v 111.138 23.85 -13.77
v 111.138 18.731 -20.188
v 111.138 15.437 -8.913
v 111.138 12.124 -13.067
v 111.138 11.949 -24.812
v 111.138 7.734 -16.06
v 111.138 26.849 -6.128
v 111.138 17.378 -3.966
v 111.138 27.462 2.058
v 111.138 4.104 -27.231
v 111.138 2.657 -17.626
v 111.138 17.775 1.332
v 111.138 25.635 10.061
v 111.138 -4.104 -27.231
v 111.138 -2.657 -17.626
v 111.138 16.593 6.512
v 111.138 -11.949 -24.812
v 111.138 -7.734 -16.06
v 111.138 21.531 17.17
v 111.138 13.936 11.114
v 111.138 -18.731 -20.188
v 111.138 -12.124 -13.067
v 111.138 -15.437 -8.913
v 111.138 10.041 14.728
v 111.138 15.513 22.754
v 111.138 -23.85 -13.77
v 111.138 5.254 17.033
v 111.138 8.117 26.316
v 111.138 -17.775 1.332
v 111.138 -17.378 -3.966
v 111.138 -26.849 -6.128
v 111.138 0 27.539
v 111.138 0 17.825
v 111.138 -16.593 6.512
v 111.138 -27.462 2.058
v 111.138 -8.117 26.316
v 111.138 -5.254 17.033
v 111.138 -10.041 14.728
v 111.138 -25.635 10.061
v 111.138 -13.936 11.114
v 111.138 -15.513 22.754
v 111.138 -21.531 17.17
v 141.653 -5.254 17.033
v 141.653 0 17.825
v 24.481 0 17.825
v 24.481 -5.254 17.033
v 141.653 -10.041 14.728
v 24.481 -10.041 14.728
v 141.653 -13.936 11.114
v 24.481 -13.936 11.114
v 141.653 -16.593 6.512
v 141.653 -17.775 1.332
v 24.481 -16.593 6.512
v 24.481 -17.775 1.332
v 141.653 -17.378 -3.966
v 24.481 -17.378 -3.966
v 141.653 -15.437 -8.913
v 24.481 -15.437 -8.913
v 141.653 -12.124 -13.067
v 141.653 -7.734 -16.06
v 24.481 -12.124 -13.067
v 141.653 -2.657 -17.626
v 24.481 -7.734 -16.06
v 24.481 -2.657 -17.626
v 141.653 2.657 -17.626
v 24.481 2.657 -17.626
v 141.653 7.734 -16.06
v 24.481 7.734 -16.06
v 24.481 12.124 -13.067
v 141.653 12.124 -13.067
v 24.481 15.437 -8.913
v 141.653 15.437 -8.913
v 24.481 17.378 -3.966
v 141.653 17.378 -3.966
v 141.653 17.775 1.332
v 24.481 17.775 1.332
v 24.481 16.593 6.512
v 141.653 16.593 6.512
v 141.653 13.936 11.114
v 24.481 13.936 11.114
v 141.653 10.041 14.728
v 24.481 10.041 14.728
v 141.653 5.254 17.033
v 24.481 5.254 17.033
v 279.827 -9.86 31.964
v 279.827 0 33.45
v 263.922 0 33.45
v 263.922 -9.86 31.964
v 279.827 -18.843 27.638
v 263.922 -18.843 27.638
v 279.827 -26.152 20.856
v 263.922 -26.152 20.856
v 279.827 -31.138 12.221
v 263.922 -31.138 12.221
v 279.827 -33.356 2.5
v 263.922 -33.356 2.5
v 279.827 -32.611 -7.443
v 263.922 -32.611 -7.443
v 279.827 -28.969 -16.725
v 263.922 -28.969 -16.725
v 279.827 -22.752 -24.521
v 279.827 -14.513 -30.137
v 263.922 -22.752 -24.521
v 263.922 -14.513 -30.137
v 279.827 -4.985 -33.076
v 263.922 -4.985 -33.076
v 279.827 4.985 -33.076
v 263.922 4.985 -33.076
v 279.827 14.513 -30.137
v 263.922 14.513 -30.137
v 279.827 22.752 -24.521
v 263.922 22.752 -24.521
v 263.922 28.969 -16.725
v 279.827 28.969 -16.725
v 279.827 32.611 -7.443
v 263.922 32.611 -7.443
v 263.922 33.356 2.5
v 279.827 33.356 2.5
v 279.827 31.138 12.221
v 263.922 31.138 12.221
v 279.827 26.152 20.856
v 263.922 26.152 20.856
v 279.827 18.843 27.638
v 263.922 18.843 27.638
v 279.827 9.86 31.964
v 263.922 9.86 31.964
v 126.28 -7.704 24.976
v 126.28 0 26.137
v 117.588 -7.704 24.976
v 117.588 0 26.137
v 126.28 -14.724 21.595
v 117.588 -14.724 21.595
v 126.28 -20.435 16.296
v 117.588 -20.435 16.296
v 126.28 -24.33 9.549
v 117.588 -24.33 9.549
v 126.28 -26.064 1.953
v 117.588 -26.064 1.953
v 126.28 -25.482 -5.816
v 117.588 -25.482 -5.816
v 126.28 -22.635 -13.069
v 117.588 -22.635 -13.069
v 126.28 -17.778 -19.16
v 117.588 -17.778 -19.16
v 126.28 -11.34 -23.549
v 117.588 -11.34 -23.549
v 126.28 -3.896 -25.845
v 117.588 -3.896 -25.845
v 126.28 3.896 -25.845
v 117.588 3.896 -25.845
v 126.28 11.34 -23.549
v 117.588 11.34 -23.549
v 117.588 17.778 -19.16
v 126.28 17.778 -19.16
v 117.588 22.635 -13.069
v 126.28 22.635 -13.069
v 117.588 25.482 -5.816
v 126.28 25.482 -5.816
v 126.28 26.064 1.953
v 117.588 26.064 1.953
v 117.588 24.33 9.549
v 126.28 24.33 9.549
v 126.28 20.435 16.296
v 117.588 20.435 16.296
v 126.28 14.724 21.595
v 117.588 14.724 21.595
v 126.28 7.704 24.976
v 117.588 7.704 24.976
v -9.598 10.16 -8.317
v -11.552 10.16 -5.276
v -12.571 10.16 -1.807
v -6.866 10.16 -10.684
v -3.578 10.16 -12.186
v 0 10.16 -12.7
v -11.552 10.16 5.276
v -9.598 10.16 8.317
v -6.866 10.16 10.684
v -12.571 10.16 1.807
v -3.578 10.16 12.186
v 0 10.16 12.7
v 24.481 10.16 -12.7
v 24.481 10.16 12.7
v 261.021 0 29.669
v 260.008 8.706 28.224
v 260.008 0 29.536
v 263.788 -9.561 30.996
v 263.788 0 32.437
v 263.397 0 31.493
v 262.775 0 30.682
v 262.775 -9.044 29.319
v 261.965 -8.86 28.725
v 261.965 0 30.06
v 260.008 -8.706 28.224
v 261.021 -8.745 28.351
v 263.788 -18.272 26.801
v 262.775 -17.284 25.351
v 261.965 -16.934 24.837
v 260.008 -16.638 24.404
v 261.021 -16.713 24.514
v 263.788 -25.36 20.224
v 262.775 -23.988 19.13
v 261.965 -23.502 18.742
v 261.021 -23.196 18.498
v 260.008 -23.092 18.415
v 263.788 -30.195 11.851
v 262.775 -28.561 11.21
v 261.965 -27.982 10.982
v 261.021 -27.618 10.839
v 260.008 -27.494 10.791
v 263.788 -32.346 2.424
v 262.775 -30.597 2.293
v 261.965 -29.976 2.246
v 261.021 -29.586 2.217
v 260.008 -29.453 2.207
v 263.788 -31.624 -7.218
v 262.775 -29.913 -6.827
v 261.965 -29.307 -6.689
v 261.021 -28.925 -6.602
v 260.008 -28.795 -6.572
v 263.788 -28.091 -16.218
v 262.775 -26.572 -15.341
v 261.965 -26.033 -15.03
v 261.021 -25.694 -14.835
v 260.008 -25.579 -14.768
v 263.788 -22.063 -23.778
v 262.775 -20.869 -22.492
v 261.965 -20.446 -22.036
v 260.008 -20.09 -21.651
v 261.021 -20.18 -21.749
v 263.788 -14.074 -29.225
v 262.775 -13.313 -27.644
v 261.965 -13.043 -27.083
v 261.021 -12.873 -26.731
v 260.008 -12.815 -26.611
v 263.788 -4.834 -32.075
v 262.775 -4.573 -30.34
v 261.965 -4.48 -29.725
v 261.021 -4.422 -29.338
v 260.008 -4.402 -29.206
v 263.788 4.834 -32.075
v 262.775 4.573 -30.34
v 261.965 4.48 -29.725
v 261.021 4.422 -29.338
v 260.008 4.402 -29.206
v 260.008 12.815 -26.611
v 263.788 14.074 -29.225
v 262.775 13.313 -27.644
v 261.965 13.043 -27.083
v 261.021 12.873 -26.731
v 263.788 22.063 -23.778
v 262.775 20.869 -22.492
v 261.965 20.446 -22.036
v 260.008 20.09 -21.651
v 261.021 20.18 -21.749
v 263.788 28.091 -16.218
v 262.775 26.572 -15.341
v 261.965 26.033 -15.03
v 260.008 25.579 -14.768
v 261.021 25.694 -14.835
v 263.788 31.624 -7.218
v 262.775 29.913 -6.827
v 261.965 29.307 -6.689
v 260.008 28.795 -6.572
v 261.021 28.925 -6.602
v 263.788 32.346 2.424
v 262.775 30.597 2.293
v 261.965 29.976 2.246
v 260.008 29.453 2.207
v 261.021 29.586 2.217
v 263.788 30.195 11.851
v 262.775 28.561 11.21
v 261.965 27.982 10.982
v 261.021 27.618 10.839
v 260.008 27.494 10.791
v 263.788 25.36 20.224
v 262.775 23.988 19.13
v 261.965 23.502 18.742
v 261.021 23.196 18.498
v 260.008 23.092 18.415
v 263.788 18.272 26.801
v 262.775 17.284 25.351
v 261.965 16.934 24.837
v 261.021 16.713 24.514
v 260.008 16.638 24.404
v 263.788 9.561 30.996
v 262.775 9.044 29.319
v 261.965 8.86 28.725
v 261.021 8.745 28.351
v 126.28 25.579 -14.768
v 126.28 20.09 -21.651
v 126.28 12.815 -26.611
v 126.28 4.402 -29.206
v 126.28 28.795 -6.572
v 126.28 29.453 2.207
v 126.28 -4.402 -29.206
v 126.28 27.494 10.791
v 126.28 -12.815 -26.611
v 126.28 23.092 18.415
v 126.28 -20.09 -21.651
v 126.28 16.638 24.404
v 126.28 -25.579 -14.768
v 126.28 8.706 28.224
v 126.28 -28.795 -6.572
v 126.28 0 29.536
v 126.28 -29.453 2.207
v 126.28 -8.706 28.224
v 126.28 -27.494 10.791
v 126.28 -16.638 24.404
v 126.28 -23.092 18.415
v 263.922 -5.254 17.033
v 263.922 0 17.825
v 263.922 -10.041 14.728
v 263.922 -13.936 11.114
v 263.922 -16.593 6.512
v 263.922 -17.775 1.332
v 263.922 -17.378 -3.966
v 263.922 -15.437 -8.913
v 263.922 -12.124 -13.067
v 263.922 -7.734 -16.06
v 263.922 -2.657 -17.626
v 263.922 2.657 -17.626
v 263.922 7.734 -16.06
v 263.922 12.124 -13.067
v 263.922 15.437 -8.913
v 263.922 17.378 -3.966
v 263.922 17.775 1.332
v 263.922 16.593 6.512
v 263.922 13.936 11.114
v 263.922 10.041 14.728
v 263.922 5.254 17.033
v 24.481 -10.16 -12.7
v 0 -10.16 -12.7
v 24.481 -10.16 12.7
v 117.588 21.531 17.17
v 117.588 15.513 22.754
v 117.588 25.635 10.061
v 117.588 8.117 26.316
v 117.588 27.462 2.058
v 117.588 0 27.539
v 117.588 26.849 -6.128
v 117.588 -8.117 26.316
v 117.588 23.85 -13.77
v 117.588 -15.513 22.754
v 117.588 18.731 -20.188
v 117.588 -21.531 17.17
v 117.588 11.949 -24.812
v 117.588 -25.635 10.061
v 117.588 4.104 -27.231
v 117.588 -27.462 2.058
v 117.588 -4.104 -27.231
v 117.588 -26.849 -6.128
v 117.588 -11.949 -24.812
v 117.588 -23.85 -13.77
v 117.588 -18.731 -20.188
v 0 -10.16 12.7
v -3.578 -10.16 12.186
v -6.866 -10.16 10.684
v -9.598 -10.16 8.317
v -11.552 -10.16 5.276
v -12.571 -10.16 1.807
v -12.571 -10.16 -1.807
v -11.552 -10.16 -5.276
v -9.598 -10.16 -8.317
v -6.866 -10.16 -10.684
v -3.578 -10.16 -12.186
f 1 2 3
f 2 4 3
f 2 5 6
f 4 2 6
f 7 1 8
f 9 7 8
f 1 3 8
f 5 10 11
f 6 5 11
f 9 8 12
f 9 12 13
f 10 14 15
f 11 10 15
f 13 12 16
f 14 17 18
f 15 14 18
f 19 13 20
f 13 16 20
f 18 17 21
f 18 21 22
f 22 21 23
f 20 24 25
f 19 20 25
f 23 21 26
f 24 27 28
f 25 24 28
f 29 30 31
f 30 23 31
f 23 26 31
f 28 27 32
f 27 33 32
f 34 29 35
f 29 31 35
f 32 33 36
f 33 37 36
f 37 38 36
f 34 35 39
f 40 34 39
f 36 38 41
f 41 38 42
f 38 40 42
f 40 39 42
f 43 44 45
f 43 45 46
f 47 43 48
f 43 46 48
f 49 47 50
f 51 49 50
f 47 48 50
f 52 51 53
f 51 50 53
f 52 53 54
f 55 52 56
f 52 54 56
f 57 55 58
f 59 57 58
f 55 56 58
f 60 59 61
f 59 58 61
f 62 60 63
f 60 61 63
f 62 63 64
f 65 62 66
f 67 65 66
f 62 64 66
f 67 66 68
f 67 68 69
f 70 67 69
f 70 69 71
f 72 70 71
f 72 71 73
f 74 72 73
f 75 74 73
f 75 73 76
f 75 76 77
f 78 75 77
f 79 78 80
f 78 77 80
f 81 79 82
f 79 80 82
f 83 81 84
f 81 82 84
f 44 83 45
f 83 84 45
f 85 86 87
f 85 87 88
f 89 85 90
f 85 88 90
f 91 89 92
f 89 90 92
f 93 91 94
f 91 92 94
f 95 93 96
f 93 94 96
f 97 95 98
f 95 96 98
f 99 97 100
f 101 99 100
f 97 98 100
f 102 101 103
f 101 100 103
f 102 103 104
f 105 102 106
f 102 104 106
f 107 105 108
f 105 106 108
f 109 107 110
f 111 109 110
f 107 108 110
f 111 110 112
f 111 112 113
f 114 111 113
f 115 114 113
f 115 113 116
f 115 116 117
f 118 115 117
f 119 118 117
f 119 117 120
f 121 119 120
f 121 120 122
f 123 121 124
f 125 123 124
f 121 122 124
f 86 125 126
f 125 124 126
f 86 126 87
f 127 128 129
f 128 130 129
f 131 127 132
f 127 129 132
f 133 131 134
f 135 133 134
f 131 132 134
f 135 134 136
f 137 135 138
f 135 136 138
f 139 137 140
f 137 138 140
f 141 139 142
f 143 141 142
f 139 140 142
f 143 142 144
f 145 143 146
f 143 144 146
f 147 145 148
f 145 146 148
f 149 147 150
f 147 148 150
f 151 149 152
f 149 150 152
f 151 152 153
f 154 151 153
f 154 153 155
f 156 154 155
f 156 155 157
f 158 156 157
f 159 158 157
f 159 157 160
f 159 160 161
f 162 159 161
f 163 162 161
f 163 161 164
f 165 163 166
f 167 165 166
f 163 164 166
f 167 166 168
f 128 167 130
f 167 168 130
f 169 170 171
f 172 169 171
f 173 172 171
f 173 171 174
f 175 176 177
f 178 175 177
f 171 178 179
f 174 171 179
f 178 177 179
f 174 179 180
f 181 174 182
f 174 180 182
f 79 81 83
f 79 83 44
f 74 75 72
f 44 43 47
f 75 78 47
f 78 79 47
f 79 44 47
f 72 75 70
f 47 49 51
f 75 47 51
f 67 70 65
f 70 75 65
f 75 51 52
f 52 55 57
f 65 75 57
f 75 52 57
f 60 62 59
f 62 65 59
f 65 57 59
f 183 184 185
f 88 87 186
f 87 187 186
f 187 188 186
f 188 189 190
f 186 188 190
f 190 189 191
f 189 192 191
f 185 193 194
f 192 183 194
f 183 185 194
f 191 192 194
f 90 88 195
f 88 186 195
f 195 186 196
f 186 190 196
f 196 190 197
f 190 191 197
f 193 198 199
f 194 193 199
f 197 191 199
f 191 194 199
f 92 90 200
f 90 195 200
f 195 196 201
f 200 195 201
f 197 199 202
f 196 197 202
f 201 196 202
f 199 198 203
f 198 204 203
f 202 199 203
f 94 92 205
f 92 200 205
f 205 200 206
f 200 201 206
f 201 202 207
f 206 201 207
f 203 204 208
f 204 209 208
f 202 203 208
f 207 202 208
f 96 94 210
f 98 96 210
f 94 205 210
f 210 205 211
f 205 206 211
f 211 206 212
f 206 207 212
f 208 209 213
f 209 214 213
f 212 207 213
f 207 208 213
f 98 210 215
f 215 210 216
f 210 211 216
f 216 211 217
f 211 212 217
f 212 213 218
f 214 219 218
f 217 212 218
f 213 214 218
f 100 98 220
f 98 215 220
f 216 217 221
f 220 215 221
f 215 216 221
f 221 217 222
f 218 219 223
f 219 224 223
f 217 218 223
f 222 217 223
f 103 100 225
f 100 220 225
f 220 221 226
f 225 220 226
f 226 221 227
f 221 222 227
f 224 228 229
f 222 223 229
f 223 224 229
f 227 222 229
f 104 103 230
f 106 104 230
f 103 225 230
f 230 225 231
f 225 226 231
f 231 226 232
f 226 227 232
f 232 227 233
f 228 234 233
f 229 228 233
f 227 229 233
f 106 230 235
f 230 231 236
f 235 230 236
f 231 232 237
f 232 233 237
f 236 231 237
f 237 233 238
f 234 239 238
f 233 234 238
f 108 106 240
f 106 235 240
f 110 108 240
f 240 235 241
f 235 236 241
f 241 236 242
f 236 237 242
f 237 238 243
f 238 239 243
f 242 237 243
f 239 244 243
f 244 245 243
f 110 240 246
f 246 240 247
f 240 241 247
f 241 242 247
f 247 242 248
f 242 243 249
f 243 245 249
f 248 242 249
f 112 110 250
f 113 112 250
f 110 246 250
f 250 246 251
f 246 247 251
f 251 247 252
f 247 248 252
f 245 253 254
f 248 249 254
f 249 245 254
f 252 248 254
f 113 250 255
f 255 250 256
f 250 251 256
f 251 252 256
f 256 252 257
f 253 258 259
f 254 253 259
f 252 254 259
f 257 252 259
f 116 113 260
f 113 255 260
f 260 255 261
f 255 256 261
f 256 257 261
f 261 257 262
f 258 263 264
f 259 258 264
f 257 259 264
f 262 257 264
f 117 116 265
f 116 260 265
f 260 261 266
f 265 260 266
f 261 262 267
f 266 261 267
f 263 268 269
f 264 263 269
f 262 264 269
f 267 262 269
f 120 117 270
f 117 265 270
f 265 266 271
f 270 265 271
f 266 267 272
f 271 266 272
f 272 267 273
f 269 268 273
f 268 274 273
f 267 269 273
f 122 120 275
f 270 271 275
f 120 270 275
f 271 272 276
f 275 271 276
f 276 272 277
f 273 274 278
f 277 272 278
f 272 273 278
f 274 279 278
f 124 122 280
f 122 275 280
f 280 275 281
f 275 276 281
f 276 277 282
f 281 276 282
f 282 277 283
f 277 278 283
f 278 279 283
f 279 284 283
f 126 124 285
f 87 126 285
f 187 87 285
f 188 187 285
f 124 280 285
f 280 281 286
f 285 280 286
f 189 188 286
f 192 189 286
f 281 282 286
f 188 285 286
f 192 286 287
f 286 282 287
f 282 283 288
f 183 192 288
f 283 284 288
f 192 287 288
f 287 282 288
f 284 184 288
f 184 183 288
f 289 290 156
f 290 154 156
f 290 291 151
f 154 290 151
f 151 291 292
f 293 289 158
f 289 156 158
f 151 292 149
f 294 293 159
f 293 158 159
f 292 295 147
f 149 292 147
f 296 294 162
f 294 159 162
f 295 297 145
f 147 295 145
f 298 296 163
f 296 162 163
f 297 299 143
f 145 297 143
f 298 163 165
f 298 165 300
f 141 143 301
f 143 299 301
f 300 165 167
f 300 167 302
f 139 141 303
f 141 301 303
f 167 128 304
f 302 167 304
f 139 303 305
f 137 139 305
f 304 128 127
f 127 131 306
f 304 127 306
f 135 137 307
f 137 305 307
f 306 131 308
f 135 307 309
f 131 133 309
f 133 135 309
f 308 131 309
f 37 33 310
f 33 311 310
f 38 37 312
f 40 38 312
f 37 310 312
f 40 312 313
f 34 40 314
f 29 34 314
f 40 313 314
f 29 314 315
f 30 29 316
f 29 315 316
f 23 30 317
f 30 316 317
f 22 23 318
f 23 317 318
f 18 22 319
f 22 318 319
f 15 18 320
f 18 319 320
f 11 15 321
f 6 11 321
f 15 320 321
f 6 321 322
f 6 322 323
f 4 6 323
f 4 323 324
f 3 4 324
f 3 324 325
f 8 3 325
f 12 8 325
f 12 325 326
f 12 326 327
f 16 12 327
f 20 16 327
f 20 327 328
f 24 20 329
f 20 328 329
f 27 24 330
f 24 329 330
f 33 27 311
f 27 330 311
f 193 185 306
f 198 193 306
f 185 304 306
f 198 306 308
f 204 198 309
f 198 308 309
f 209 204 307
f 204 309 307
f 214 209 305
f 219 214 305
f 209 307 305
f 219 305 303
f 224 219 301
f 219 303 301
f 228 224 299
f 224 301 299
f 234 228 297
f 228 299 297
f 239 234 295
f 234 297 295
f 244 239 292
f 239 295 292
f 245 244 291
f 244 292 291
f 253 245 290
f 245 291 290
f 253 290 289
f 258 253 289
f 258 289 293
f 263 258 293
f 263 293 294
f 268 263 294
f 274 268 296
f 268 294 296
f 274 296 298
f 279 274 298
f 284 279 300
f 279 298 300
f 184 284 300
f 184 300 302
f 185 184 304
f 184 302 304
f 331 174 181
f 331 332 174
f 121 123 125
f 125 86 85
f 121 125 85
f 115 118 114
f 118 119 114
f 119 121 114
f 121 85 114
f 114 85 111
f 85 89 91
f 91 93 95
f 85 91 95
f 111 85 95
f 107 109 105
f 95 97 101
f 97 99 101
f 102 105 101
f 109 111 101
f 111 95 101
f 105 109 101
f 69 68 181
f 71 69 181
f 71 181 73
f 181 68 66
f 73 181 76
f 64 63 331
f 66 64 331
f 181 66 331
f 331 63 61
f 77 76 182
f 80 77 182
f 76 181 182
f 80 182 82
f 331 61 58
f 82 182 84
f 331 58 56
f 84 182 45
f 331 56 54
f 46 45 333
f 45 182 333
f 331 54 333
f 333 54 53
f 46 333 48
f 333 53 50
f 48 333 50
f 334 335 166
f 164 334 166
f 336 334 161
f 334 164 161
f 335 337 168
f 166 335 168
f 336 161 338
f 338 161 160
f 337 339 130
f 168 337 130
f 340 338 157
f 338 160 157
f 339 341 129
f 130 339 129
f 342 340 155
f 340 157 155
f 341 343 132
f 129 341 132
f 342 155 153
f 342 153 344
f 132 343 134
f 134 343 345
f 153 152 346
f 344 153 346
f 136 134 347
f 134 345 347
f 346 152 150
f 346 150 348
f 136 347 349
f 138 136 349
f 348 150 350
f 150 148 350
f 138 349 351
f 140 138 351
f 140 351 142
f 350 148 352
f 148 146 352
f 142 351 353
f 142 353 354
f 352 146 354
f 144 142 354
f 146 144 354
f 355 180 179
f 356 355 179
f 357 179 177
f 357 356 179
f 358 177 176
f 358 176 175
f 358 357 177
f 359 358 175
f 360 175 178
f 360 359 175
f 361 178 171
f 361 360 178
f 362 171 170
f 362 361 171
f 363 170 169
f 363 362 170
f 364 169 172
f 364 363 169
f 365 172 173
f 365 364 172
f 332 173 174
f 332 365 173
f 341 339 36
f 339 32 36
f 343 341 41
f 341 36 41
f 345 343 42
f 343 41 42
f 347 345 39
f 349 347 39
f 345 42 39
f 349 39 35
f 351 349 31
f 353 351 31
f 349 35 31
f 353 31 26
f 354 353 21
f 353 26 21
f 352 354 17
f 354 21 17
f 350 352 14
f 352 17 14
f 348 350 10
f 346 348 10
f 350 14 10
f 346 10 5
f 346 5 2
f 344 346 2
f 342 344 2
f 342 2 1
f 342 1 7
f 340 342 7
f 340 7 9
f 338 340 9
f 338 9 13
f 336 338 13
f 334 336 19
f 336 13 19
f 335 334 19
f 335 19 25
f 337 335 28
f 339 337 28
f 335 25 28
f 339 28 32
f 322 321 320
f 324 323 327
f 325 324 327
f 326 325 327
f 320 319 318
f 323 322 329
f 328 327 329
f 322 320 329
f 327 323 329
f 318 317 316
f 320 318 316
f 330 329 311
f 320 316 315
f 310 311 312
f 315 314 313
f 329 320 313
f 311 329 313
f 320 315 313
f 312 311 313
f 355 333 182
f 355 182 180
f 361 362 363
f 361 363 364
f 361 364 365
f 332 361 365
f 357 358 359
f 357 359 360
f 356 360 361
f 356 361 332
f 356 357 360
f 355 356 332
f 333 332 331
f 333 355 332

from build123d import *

# Parameters (mm, degrees)
F0_W     = 30.5150300264
F0_H     = 17.8250912577
F3_DEPTH = 10.16


with BuildPart() as f1:
    # F0 (on Front) → F1 (revolve)
    with BuildSketch(Plane.XZ):
        with BuildLine():
            Line((111.1383140087, 26.1370334774), (111.1383140087, 17.8250912577))
            Line((111.1383140087, 17.8250912577), (141.6533440351, 17.8250912577))
            Line((141.6533440351, 17.8250912577), (263.9216091484, 17.8250912577))
            Line((263.9216091484, 17.8250912577), (263.9216091484, 0))
            Line((263.9216091484, 0), (279.8266708851, 0))
            Line((279.8266708851, 0), (279.8266708851, 10.310467582))
            Line((279.8266708851, 10.310467582), (279.8266708851, 33.449973911))
            Line((279.8266708851, 33.449973911), (263.9216091484, 33.449973911))
            ThreePointArc((263.9216091484, 33.449973911), (262.77520204, 30.6823023219), (260.0075304508, 29.5358952135))
            Line((260.0075304508, 29.5358952135), (126.2801289558, 29.5358952135))
            Line((126.2801289558, 29.5358952135), (126.2801289558, 26.1370334774))
            Line((126.2801289558, 26.1370334774), (117.5876036286, 26.1370334774))
            Line((117.5876036286, 26.1370334774), (117.5876036286, 27.5390539318))
            Line((117.5876036286, 27.5390539318), (111.1383140087, 27.5390539318))
            Line((111.1383140087, 27.5390539318), (111.1383140087, 26.1370334774))
        make_face()
    revolve(axis=Axis((152.1537210792, 0, 0), (1, 0, 0)))


with BuildPart() as f2:
    # F0 (on Front) → F2 (revolve)
    with BuildSketch(Plane.XZ):
        Polygon((24.4807712734, 12.7), (24.4807712734, 0), (111.1383140087, 0), (111.1383140087, 17.8250912577), (24.4807712734, 17.8250912577), align=None)
        with Locations((126.3958290219, 8.9125456288)):
            Rectangle(F0_W, F0_H)
    revolve(axis=Axis((152.1537210792, 0, 0), (1, 0, 0)))

    # F0 (on Front) → F3 (join, symmetric)
    with BuildSketch(Plane.XZ):
        with BuildLine():
            ThreePointArc((0, 12.7), (8.9802561211, 8.9802561211), (12.7, 0))
            Line((12.7, 0), (24.4807712734, 0))
            Line((24.4807712734, 0), (24.4807712734, 12.7))
            Line((24.4807712734, 12.7), (0, 12.7))
        make_face()
        with BuildLine():
            Line((24.4807712734, 0), (12.7, 0))
            ThreePointArc((12.7, 0), (8.9802561211, -8.9802561211), (0, -12.7))
            Line((0, -12.7), (24.4807712734, -12.7))
            Line((24.4807712734, -12.7), (24.4807712734, 0))
        make_face()
        with BuildLine():
            Line((0, 0), (12.7, 0))
            ThreePointArc((12.7, 0), (8.9802561211, 8.9802561211), (0, 12.7))
            Line((0, 12.7), (0, 0))
        make_face()
        with BuildLine():
            ThreePointArc((0, -12.7), (8.9802561211, -8.9802561211), (12.7, 0))
            Line((12.7, 0), (0, 0))
            Line((0, 0), (0, -12.7))
        make_face()
        with BuildLine():
            Line((0, 0), (0, 12.7))
            ThreePointArc((0, 12.7), (-12.7, 0), (0, -12.7))
            Line((0, -12.7), (0, 0))
        make_face()
    extrude(amount=F3_DEPTH, both=True)


solid = Compound([f1.part, f2.part])
